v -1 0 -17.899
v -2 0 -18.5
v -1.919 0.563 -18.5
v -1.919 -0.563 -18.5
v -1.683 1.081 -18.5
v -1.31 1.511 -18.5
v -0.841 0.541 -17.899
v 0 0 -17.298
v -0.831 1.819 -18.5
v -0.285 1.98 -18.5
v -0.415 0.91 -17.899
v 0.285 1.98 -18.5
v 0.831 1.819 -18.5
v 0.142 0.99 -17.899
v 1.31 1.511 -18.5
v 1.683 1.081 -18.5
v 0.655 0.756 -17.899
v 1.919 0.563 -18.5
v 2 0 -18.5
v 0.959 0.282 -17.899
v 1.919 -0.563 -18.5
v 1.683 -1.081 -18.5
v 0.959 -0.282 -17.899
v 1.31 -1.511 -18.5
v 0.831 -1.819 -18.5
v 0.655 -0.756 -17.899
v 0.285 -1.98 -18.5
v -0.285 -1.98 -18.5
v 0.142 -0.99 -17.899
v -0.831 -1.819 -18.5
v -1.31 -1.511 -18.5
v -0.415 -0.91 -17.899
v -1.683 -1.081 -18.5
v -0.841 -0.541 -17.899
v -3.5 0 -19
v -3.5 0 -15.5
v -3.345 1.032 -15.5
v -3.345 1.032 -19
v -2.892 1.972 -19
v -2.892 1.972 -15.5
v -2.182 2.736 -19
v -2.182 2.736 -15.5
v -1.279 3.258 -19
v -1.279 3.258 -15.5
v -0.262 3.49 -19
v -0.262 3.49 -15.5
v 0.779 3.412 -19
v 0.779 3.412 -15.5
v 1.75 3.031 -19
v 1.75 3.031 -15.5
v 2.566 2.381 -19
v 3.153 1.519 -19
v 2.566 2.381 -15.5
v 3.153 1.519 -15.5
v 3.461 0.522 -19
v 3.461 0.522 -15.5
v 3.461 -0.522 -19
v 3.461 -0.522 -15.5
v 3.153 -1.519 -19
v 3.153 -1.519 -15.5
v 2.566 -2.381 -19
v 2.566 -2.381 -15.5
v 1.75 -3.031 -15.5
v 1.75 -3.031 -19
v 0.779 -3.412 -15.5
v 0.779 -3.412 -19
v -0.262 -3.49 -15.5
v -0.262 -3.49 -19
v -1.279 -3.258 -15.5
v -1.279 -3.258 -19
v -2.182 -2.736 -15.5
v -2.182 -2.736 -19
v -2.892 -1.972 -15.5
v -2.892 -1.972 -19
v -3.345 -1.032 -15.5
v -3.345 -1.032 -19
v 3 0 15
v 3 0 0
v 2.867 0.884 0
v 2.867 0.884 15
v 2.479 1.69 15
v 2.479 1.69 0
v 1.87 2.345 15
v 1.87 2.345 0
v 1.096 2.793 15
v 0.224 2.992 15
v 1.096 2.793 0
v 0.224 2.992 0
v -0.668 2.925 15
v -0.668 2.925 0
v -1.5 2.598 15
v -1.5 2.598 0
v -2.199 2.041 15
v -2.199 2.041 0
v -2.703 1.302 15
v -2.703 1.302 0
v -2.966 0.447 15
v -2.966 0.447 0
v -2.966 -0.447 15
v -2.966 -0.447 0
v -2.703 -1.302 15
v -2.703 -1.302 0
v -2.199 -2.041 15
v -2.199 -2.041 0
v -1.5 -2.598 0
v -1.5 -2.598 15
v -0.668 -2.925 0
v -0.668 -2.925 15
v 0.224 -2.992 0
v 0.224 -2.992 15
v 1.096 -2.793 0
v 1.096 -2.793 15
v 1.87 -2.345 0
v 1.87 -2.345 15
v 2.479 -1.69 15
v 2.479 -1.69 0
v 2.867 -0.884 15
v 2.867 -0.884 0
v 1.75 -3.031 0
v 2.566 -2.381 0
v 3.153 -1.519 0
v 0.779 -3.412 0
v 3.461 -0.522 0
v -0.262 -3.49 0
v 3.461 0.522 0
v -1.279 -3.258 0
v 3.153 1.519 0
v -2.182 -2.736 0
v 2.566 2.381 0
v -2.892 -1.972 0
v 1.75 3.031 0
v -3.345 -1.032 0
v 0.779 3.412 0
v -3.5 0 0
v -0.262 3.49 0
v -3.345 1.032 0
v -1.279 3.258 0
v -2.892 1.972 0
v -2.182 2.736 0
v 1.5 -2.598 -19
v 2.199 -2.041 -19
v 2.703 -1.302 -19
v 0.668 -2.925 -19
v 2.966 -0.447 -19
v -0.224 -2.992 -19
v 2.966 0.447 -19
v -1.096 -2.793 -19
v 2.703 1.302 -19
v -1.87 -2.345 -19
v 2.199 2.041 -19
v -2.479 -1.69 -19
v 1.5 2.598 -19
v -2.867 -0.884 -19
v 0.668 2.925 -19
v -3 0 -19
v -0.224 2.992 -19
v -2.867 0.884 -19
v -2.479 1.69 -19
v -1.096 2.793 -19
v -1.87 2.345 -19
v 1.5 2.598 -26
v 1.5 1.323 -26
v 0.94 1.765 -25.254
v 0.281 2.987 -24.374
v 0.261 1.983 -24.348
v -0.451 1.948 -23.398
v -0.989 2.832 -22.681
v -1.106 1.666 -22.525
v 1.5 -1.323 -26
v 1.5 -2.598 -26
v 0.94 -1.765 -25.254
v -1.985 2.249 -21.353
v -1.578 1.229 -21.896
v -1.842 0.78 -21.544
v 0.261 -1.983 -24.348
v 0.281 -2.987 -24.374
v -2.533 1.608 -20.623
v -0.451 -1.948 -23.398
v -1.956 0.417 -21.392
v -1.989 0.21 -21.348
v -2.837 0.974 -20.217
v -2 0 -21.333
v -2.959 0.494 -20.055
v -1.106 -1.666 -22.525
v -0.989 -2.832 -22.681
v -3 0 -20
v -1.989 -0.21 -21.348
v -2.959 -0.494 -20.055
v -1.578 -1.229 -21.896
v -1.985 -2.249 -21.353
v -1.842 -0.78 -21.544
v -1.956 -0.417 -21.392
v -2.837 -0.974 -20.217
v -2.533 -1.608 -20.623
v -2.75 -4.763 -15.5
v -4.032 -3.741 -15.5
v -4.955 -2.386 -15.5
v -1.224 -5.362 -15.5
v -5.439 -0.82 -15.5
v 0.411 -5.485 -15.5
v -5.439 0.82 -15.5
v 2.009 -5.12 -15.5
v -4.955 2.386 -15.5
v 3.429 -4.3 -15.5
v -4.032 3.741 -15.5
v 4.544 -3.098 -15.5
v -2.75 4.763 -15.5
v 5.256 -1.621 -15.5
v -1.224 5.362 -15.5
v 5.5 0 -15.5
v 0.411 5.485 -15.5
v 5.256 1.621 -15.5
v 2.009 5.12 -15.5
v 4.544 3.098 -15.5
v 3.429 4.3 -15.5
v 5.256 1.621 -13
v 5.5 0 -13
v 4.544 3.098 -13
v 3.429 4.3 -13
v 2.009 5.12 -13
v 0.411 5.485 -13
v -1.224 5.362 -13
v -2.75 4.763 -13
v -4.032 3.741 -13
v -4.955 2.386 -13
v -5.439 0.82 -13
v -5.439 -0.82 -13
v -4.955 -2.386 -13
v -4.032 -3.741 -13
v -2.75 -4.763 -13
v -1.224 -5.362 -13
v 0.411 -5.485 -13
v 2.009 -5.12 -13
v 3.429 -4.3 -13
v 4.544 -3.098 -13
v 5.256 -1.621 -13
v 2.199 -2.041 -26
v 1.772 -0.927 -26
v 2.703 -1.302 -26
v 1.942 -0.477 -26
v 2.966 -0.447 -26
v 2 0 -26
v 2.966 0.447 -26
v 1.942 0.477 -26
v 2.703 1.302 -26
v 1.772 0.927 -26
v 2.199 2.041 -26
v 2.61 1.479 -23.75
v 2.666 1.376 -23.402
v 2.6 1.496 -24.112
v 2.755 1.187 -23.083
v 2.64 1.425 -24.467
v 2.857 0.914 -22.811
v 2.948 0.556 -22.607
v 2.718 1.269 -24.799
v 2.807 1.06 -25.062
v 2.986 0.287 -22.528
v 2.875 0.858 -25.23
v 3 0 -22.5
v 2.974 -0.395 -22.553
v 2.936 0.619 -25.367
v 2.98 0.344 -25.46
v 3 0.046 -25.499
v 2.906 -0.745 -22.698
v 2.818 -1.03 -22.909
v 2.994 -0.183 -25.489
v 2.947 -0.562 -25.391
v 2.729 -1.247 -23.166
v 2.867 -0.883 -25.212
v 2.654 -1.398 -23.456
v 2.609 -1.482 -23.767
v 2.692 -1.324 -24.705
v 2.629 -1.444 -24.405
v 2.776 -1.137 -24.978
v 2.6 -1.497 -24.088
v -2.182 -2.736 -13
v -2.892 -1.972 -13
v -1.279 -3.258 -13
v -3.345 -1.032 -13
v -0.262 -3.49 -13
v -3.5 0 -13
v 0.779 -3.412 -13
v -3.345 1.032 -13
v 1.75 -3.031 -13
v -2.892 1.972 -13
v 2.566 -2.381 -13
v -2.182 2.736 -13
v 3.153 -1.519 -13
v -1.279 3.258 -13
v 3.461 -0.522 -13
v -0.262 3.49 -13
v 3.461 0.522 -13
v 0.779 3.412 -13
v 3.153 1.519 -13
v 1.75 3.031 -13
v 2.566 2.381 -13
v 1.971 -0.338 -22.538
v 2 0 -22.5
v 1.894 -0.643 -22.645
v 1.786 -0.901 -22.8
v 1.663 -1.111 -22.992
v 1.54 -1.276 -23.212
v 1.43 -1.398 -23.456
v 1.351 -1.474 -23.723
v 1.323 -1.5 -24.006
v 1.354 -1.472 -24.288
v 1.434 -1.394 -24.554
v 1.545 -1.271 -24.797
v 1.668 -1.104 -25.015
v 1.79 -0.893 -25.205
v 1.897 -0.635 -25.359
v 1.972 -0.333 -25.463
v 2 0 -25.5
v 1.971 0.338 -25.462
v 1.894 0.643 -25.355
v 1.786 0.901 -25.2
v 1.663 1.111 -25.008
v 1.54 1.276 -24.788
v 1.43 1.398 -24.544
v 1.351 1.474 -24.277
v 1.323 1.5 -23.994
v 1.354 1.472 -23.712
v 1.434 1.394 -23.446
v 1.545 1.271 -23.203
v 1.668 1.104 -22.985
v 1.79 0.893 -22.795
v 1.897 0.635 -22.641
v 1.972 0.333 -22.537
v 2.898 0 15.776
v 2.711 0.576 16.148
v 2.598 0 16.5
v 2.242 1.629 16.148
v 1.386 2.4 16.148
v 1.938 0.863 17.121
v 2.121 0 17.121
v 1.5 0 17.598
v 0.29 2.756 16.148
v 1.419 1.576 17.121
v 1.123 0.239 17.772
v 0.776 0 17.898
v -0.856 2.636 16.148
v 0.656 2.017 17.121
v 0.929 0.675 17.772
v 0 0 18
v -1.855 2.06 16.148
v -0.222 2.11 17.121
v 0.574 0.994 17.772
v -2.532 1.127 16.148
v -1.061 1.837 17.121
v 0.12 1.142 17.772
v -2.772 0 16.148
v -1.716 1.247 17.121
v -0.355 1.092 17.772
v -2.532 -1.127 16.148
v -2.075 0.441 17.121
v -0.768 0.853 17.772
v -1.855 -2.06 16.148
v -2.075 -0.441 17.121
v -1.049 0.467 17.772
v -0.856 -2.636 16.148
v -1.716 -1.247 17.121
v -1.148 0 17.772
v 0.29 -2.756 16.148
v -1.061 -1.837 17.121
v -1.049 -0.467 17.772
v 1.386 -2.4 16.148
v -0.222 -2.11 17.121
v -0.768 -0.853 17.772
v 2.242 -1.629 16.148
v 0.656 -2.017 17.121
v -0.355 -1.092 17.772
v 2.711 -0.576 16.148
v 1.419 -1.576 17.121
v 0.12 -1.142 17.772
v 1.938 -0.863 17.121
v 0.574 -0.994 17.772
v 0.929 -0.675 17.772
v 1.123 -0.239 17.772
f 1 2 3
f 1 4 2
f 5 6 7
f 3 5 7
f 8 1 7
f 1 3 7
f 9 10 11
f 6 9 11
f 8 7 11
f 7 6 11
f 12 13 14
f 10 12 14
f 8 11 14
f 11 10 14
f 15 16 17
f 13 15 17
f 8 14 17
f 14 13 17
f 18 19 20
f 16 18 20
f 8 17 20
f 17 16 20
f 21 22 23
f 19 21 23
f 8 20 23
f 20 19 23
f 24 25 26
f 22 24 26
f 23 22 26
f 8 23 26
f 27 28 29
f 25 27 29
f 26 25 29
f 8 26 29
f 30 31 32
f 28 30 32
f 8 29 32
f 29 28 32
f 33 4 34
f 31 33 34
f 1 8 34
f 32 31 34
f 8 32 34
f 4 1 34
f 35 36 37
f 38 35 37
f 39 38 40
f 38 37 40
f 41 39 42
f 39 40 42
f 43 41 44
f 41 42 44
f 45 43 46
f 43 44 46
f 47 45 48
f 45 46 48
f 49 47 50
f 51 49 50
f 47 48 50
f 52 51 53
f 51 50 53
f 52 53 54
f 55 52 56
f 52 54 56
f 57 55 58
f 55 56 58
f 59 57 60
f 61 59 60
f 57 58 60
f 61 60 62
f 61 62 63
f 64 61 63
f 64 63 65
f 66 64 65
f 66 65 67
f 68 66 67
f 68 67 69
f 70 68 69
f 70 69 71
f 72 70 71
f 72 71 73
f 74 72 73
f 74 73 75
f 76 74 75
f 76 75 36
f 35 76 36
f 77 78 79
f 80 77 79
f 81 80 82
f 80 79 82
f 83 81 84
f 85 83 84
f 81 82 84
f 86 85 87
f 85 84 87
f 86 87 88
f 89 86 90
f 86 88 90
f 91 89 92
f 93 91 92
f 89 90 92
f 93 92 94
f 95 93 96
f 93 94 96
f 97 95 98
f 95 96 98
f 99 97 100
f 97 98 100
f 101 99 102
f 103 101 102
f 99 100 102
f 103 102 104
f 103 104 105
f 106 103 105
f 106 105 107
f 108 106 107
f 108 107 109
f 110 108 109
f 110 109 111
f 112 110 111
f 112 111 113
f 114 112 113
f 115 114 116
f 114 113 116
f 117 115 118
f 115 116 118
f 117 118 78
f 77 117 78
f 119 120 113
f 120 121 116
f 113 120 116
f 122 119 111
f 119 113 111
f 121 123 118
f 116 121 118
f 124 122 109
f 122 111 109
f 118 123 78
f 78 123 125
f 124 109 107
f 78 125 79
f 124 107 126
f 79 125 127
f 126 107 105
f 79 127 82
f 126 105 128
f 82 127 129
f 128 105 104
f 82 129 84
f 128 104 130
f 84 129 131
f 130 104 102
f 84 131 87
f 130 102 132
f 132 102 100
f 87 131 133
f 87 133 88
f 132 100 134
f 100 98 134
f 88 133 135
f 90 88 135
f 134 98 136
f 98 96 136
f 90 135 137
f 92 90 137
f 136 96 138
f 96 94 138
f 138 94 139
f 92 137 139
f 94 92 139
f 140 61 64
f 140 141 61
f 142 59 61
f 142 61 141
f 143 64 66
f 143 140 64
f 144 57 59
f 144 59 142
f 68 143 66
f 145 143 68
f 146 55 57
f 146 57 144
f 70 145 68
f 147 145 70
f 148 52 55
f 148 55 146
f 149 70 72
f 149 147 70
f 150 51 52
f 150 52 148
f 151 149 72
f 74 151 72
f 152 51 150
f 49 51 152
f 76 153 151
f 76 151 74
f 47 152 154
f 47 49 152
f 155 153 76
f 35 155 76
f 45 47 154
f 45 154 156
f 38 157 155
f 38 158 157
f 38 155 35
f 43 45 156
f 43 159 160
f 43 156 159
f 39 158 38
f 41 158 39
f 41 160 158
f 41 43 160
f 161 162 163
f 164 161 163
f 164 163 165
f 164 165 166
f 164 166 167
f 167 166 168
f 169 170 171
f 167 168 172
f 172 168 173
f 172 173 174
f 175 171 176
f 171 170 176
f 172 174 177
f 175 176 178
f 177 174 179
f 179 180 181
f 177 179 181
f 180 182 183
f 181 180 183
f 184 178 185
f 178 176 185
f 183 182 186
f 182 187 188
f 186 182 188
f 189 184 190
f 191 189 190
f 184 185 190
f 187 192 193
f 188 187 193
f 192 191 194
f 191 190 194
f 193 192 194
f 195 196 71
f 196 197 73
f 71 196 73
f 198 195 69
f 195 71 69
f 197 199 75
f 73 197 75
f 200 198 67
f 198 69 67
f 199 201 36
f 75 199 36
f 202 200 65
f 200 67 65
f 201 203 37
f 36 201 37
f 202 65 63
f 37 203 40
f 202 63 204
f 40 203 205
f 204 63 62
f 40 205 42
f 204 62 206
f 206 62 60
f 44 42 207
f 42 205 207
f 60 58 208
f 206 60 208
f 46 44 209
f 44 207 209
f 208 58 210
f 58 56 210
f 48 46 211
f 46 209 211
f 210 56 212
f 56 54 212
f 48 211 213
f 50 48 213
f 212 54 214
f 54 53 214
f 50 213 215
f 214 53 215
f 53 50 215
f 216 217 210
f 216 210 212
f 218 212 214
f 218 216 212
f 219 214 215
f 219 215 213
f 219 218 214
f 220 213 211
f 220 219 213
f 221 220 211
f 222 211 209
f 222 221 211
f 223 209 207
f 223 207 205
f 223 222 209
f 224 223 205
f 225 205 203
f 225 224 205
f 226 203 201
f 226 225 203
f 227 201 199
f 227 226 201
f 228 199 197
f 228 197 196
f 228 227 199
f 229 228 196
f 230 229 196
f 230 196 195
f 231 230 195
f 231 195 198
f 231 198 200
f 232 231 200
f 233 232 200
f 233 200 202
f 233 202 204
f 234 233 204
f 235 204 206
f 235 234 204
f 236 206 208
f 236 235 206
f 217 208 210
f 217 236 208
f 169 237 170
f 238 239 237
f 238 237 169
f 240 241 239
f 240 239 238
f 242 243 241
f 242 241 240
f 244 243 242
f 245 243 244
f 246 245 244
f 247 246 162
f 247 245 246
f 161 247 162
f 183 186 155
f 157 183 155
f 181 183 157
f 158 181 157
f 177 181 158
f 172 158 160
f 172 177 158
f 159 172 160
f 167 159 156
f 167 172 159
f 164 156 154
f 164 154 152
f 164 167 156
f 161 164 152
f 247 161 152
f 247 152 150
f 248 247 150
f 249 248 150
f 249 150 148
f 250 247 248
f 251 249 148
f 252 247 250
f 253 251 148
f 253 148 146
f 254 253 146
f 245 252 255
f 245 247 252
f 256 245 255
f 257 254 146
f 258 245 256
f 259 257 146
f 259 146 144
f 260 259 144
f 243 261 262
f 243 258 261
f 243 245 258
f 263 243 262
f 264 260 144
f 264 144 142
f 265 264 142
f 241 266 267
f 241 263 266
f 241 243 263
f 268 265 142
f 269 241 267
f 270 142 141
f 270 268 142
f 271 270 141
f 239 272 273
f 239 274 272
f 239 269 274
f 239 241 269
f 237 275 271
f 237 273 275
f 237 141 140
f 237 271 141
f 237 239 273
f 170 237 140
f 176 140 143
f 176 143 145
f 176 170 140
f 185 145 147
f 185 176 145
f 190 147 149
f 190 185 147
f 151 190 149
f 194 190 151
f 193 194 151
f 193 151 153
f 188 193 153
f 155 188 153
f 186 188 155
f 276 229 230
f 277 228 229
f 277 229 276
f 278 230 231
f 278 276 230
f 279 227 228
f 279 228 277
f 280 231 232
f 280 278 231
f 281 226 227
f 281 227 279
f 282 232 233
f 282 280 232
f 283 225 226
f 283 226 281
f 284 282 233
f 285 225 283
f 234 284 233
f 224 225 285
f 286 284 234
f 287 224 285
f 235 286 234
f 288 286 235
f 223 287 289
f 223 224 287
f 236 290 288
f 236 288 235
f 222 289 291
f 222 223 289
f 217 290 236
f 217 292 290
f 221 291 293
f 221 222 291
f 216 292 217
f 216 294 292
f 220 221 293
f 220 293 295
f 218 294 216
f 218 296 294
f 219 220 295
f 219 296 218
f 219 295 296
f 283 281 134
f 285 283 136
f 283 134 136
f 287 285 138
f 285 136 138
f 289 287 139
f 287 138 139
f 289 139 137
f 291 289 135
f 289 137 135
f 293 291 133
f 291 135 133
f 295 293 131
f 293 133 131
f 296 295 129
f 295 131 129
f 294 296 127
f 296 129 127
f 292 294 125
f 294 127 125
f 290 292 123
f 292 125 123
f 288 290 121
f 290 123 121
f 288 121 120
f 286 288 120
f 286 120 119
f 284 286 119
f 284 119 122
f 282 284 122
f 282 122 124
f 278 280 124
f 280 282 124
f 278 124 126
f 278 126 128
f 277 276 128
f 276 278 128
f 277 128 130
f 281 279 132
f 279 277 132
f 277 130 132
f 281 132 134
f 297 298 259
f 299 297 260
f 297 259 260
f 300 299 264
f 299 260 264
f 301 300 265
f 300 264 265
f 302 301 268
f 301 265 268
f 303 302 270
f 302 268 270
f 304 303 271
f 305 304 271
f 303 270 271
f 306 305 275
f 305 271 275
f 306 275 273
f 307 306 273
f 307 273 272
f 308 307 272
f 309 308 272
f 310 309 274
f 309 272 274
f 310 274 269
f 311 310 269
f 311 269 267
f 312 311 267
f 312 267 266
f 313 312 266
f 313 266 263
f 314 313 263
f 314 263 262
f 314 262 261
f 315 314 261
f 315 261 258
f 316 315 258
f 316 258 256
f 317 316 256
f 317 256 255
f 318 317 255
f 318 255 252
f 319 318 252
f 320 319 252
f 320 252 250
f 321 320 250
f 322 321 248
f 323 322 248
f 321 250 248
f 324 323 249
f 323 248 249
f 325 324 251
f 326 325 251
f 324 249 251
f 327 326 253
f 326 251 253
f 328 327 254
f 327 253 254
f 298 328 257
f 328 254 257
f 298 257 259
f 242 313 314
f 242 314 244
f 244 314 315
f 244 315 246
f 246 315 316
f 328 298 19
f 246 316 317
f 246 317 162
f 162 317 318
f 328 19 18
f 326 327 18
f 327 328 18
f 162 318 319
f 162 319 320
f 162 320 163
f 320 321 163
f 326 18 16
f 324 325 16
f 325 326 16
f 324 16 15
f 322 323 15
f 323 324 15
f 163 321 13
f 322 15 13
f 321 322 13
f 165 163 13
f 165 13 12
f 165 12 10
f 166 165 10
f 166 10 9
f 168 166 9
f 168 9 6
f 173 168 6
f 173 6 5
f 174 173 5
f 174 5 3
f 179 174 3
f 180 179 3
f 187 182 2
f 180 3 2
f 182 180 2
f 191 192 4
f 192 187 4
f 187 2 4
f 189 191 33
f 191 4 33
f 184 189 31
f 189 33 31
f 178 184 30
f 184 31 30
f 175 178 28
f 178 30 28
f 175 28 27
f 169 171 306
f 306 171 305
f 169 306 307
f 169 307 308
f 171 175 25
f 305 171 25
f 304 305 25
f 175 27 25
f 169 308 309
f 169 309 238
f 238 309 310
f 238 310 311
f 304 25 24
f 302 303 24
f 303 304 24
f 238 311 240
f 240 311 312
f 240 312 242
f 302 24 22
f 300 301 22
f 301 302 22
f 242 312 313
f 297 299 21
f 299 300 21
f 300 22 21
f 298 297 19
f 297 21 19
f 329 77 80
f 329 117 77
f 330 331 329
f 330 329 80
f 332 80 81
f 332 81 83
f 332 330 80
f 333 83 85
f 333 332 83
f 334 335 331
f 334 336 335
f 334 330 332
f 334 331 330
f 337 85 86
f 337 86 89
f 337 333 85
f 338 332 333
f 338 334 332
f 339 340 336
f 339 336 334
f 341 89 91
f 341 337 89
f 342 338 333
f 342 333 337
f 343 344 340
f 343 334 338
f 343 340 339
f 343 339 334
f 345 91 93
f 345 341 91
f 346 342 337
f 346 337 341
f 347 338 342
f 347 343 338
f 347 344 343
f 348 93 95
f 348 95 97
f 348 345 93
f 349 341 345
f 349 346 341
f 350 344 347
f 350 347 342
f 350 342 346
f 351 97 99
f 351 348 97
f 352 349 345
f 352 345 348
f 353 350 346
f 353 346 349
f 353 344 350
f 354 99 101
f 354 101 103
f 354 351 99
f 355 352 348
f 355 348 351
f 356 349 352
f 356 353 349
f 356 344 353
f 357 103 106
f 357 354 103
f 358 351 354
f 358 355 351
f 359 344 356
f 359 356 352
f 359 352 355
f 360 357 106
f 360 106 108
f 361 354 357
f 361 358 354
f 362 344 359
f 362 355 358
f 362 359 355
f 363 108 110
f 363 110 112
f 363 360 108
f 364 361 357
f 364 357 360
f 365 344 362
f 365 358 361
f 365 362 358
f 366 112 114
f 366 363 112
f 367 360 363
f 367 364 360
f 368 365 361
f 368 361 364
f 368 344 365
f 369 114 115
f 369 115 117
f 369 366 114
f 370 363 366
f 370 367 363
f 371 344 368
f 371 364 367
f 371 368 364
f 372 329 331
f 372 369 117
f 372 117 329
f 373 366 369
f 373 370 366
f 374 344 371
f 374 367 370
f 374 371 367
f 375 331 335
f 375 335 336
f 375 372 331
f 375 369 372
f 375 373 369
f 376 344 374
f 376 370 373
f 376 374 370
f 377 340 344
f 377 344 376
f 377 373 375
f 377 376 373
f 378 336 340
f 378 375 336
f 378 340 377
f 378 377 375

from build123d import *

# Parameters (mm, degrees)
SKETCH_1_R                = 3
EXTRUDE_1_DEPTH           = 15
DOME_1_FACE_RADIUS        = 3
DOME_1_HEIGHT             = 3
SKETCH_4_R                = 3.5
EXTRUDE_2_DEPTH           = 26
SKETCH_5_R                = 3.5
SKETCH_5_R_2              = 3
CUT_EXTRUDE_3_DEPTH       = 7
EXTRUDE_START             = -13
SKETCH_6_R                = 5.5
EXTRUDE_3_DEPTH           = 2.5
HOLE_WIZARD_4_0_4_1_D     = 4
HOLE_WIZARD_4_0_4_1_DEPTH = 7.5
HOLE_WIZARD_4_0_4_1_TIP   = 1.201721238
HOLE_WIZARD_3_0_3_1_D     = 3
HOLE_WIZARD_3_0_3_1_DEPTH = 9
HOLE_WIZARD_3_0_3_1_TIP   = 0.901290929
CUT_EXTRUDE_4_DEPTH       = 6.5
CUT_EXTRUDE_4_DEPTH_BACK  = 6.5


with BuildPart() as part:
    # Sketch 1 → Extrude 1 (new body)
    with BuildSketch(Plane.XY):
        Circle(SKETCH_1_R)
    extrude(amount=EXTRUDE_1_DEPTH)

    # Dome 1: a dome of height H over a round flat face of radius A is a cap of a sphere of radius (A * A + H * H) / (2 * H)
    dome_1_r = (DOME_1_FACE_RADIUS * DOME_1_FACE_RADIUS + DOME_1_HEIGHT * DOME_1_HEIGHT) / (2 * DOME_1_HEIGHT)
    dome_1_base = Plane((0, 0, 15), z_dir=(0, 0, 1))
    with Locations(dome_1_base.offset(DOME_1_HEIGHT - dome_1_r)):
        dome_1_ball = Sphere(dome_1_r, mode=Mode.PRIVATE)
    add(split(dome_1_ball, bisect_by=dome_1_base, keep=Keep.TOP, mode=Mode.PRIVATE))

    # Sketch 4 → Extrude 2 (add)
    with BuildSketch(Plane(origin=(0, 0, 0), x_dir=(-1, 0, 0), z_dir=(0, 0, -1))):
        Circle(SKETCH_4_R)
    extrude(amount=EXTRUDE_2_DEPTH)

    # Sketch 5 → Cut-Extrude 3 (cut)
    with BuildSketch(Plane(origin=(0, 0, -26), x_dir=(-1, 0, 0), z_dir=(0, 0, -1))):
        Circle(SKETCH_5_R)
        Circle(SKETCH_5_R_2, mode=Mode.SUBTRACT)
    extrude(amount=-CUT_EXTRUDE_3_DEPTH, mode=Mode.SUBTRACT)

    # Sketch 6 → Extrude 3 (add)
    with BuildSketch(Plane.XY.offset(EXTRUDE_START)):
        Circle(SKETCH_6_R)
    extrude(amount=-EXTRUDE_3_DEPTH)

    # Hole Wizard 4.0 _4_1
    with Locations(Plane(origin=(0, 0, -26), x_dir=(-1, 0, 0), z_dir=(0, 0, -1))):
        with Locations((0, 0)):
            Hole(HOLE_WIZARD_4_0_4_1_D / 2, depth=HOLE_WIZARD_4_0_4_1_DEPTH)
            with Locations((0, 0, -(HOLE_WIZARD_4_0_4_1_DEPTH + HOLE_WIZARD_4_0_4_1_TIP / 2))):  # 118° drill point
                Cone(0, HOLE_WIZARD_4_0_4_1_D / 2, HOLE_WIZARD_4_0_4_1_TIP, mode=Mode.SUBTRACT)

    # Hole Wizard 3.0 _3_1
    with Locations(Plane(origin=(-3, 0, -24), x_dir=(0, 0, -1), z_dir=(-1, 0, 0))):
        with Locations((0, 0)):
            Hole(HOLE_WIZARD_3_0_3_1_D / 2, depth=HOLE_WIZARD_3_0_3_1_DEPTH)
            with Locations((0, 0, -(HOLE_WIZARD_3_0_3_1_DEPTH + HOLE_WIZARD_3_0_3_1_TIP / 2))):  # 118° drill point
                Cone(0, HOLE_WIZARD_3_0_3_1_D / 2, HOLE_WIZARD_3_0_3_1_TIP, mode=Mode.SUBTRACT)

    # Sketch 12 → Cut-Extrude 4 (cut, two sides)
    with BuildSketch(Plane(origin=(0, 0, 0), x_dir=(1, 0, 0), z_dir=(0, 1, 0))) as cut_extrude_4_sk:
        Polygon((1.5, 26), (-3, 20), (-3, 26), align=None)
    extrude(amount=CUT_EXTRUDE_4_DEPTH, mode=Mode.SUBTRACT)
    extrude(cut_extrude_4_sk.sketch, amount=-CUT_EXTRUDE_4_DEPTH_BACK, mode=Mode.SUBTRACT)


solid = part.part
